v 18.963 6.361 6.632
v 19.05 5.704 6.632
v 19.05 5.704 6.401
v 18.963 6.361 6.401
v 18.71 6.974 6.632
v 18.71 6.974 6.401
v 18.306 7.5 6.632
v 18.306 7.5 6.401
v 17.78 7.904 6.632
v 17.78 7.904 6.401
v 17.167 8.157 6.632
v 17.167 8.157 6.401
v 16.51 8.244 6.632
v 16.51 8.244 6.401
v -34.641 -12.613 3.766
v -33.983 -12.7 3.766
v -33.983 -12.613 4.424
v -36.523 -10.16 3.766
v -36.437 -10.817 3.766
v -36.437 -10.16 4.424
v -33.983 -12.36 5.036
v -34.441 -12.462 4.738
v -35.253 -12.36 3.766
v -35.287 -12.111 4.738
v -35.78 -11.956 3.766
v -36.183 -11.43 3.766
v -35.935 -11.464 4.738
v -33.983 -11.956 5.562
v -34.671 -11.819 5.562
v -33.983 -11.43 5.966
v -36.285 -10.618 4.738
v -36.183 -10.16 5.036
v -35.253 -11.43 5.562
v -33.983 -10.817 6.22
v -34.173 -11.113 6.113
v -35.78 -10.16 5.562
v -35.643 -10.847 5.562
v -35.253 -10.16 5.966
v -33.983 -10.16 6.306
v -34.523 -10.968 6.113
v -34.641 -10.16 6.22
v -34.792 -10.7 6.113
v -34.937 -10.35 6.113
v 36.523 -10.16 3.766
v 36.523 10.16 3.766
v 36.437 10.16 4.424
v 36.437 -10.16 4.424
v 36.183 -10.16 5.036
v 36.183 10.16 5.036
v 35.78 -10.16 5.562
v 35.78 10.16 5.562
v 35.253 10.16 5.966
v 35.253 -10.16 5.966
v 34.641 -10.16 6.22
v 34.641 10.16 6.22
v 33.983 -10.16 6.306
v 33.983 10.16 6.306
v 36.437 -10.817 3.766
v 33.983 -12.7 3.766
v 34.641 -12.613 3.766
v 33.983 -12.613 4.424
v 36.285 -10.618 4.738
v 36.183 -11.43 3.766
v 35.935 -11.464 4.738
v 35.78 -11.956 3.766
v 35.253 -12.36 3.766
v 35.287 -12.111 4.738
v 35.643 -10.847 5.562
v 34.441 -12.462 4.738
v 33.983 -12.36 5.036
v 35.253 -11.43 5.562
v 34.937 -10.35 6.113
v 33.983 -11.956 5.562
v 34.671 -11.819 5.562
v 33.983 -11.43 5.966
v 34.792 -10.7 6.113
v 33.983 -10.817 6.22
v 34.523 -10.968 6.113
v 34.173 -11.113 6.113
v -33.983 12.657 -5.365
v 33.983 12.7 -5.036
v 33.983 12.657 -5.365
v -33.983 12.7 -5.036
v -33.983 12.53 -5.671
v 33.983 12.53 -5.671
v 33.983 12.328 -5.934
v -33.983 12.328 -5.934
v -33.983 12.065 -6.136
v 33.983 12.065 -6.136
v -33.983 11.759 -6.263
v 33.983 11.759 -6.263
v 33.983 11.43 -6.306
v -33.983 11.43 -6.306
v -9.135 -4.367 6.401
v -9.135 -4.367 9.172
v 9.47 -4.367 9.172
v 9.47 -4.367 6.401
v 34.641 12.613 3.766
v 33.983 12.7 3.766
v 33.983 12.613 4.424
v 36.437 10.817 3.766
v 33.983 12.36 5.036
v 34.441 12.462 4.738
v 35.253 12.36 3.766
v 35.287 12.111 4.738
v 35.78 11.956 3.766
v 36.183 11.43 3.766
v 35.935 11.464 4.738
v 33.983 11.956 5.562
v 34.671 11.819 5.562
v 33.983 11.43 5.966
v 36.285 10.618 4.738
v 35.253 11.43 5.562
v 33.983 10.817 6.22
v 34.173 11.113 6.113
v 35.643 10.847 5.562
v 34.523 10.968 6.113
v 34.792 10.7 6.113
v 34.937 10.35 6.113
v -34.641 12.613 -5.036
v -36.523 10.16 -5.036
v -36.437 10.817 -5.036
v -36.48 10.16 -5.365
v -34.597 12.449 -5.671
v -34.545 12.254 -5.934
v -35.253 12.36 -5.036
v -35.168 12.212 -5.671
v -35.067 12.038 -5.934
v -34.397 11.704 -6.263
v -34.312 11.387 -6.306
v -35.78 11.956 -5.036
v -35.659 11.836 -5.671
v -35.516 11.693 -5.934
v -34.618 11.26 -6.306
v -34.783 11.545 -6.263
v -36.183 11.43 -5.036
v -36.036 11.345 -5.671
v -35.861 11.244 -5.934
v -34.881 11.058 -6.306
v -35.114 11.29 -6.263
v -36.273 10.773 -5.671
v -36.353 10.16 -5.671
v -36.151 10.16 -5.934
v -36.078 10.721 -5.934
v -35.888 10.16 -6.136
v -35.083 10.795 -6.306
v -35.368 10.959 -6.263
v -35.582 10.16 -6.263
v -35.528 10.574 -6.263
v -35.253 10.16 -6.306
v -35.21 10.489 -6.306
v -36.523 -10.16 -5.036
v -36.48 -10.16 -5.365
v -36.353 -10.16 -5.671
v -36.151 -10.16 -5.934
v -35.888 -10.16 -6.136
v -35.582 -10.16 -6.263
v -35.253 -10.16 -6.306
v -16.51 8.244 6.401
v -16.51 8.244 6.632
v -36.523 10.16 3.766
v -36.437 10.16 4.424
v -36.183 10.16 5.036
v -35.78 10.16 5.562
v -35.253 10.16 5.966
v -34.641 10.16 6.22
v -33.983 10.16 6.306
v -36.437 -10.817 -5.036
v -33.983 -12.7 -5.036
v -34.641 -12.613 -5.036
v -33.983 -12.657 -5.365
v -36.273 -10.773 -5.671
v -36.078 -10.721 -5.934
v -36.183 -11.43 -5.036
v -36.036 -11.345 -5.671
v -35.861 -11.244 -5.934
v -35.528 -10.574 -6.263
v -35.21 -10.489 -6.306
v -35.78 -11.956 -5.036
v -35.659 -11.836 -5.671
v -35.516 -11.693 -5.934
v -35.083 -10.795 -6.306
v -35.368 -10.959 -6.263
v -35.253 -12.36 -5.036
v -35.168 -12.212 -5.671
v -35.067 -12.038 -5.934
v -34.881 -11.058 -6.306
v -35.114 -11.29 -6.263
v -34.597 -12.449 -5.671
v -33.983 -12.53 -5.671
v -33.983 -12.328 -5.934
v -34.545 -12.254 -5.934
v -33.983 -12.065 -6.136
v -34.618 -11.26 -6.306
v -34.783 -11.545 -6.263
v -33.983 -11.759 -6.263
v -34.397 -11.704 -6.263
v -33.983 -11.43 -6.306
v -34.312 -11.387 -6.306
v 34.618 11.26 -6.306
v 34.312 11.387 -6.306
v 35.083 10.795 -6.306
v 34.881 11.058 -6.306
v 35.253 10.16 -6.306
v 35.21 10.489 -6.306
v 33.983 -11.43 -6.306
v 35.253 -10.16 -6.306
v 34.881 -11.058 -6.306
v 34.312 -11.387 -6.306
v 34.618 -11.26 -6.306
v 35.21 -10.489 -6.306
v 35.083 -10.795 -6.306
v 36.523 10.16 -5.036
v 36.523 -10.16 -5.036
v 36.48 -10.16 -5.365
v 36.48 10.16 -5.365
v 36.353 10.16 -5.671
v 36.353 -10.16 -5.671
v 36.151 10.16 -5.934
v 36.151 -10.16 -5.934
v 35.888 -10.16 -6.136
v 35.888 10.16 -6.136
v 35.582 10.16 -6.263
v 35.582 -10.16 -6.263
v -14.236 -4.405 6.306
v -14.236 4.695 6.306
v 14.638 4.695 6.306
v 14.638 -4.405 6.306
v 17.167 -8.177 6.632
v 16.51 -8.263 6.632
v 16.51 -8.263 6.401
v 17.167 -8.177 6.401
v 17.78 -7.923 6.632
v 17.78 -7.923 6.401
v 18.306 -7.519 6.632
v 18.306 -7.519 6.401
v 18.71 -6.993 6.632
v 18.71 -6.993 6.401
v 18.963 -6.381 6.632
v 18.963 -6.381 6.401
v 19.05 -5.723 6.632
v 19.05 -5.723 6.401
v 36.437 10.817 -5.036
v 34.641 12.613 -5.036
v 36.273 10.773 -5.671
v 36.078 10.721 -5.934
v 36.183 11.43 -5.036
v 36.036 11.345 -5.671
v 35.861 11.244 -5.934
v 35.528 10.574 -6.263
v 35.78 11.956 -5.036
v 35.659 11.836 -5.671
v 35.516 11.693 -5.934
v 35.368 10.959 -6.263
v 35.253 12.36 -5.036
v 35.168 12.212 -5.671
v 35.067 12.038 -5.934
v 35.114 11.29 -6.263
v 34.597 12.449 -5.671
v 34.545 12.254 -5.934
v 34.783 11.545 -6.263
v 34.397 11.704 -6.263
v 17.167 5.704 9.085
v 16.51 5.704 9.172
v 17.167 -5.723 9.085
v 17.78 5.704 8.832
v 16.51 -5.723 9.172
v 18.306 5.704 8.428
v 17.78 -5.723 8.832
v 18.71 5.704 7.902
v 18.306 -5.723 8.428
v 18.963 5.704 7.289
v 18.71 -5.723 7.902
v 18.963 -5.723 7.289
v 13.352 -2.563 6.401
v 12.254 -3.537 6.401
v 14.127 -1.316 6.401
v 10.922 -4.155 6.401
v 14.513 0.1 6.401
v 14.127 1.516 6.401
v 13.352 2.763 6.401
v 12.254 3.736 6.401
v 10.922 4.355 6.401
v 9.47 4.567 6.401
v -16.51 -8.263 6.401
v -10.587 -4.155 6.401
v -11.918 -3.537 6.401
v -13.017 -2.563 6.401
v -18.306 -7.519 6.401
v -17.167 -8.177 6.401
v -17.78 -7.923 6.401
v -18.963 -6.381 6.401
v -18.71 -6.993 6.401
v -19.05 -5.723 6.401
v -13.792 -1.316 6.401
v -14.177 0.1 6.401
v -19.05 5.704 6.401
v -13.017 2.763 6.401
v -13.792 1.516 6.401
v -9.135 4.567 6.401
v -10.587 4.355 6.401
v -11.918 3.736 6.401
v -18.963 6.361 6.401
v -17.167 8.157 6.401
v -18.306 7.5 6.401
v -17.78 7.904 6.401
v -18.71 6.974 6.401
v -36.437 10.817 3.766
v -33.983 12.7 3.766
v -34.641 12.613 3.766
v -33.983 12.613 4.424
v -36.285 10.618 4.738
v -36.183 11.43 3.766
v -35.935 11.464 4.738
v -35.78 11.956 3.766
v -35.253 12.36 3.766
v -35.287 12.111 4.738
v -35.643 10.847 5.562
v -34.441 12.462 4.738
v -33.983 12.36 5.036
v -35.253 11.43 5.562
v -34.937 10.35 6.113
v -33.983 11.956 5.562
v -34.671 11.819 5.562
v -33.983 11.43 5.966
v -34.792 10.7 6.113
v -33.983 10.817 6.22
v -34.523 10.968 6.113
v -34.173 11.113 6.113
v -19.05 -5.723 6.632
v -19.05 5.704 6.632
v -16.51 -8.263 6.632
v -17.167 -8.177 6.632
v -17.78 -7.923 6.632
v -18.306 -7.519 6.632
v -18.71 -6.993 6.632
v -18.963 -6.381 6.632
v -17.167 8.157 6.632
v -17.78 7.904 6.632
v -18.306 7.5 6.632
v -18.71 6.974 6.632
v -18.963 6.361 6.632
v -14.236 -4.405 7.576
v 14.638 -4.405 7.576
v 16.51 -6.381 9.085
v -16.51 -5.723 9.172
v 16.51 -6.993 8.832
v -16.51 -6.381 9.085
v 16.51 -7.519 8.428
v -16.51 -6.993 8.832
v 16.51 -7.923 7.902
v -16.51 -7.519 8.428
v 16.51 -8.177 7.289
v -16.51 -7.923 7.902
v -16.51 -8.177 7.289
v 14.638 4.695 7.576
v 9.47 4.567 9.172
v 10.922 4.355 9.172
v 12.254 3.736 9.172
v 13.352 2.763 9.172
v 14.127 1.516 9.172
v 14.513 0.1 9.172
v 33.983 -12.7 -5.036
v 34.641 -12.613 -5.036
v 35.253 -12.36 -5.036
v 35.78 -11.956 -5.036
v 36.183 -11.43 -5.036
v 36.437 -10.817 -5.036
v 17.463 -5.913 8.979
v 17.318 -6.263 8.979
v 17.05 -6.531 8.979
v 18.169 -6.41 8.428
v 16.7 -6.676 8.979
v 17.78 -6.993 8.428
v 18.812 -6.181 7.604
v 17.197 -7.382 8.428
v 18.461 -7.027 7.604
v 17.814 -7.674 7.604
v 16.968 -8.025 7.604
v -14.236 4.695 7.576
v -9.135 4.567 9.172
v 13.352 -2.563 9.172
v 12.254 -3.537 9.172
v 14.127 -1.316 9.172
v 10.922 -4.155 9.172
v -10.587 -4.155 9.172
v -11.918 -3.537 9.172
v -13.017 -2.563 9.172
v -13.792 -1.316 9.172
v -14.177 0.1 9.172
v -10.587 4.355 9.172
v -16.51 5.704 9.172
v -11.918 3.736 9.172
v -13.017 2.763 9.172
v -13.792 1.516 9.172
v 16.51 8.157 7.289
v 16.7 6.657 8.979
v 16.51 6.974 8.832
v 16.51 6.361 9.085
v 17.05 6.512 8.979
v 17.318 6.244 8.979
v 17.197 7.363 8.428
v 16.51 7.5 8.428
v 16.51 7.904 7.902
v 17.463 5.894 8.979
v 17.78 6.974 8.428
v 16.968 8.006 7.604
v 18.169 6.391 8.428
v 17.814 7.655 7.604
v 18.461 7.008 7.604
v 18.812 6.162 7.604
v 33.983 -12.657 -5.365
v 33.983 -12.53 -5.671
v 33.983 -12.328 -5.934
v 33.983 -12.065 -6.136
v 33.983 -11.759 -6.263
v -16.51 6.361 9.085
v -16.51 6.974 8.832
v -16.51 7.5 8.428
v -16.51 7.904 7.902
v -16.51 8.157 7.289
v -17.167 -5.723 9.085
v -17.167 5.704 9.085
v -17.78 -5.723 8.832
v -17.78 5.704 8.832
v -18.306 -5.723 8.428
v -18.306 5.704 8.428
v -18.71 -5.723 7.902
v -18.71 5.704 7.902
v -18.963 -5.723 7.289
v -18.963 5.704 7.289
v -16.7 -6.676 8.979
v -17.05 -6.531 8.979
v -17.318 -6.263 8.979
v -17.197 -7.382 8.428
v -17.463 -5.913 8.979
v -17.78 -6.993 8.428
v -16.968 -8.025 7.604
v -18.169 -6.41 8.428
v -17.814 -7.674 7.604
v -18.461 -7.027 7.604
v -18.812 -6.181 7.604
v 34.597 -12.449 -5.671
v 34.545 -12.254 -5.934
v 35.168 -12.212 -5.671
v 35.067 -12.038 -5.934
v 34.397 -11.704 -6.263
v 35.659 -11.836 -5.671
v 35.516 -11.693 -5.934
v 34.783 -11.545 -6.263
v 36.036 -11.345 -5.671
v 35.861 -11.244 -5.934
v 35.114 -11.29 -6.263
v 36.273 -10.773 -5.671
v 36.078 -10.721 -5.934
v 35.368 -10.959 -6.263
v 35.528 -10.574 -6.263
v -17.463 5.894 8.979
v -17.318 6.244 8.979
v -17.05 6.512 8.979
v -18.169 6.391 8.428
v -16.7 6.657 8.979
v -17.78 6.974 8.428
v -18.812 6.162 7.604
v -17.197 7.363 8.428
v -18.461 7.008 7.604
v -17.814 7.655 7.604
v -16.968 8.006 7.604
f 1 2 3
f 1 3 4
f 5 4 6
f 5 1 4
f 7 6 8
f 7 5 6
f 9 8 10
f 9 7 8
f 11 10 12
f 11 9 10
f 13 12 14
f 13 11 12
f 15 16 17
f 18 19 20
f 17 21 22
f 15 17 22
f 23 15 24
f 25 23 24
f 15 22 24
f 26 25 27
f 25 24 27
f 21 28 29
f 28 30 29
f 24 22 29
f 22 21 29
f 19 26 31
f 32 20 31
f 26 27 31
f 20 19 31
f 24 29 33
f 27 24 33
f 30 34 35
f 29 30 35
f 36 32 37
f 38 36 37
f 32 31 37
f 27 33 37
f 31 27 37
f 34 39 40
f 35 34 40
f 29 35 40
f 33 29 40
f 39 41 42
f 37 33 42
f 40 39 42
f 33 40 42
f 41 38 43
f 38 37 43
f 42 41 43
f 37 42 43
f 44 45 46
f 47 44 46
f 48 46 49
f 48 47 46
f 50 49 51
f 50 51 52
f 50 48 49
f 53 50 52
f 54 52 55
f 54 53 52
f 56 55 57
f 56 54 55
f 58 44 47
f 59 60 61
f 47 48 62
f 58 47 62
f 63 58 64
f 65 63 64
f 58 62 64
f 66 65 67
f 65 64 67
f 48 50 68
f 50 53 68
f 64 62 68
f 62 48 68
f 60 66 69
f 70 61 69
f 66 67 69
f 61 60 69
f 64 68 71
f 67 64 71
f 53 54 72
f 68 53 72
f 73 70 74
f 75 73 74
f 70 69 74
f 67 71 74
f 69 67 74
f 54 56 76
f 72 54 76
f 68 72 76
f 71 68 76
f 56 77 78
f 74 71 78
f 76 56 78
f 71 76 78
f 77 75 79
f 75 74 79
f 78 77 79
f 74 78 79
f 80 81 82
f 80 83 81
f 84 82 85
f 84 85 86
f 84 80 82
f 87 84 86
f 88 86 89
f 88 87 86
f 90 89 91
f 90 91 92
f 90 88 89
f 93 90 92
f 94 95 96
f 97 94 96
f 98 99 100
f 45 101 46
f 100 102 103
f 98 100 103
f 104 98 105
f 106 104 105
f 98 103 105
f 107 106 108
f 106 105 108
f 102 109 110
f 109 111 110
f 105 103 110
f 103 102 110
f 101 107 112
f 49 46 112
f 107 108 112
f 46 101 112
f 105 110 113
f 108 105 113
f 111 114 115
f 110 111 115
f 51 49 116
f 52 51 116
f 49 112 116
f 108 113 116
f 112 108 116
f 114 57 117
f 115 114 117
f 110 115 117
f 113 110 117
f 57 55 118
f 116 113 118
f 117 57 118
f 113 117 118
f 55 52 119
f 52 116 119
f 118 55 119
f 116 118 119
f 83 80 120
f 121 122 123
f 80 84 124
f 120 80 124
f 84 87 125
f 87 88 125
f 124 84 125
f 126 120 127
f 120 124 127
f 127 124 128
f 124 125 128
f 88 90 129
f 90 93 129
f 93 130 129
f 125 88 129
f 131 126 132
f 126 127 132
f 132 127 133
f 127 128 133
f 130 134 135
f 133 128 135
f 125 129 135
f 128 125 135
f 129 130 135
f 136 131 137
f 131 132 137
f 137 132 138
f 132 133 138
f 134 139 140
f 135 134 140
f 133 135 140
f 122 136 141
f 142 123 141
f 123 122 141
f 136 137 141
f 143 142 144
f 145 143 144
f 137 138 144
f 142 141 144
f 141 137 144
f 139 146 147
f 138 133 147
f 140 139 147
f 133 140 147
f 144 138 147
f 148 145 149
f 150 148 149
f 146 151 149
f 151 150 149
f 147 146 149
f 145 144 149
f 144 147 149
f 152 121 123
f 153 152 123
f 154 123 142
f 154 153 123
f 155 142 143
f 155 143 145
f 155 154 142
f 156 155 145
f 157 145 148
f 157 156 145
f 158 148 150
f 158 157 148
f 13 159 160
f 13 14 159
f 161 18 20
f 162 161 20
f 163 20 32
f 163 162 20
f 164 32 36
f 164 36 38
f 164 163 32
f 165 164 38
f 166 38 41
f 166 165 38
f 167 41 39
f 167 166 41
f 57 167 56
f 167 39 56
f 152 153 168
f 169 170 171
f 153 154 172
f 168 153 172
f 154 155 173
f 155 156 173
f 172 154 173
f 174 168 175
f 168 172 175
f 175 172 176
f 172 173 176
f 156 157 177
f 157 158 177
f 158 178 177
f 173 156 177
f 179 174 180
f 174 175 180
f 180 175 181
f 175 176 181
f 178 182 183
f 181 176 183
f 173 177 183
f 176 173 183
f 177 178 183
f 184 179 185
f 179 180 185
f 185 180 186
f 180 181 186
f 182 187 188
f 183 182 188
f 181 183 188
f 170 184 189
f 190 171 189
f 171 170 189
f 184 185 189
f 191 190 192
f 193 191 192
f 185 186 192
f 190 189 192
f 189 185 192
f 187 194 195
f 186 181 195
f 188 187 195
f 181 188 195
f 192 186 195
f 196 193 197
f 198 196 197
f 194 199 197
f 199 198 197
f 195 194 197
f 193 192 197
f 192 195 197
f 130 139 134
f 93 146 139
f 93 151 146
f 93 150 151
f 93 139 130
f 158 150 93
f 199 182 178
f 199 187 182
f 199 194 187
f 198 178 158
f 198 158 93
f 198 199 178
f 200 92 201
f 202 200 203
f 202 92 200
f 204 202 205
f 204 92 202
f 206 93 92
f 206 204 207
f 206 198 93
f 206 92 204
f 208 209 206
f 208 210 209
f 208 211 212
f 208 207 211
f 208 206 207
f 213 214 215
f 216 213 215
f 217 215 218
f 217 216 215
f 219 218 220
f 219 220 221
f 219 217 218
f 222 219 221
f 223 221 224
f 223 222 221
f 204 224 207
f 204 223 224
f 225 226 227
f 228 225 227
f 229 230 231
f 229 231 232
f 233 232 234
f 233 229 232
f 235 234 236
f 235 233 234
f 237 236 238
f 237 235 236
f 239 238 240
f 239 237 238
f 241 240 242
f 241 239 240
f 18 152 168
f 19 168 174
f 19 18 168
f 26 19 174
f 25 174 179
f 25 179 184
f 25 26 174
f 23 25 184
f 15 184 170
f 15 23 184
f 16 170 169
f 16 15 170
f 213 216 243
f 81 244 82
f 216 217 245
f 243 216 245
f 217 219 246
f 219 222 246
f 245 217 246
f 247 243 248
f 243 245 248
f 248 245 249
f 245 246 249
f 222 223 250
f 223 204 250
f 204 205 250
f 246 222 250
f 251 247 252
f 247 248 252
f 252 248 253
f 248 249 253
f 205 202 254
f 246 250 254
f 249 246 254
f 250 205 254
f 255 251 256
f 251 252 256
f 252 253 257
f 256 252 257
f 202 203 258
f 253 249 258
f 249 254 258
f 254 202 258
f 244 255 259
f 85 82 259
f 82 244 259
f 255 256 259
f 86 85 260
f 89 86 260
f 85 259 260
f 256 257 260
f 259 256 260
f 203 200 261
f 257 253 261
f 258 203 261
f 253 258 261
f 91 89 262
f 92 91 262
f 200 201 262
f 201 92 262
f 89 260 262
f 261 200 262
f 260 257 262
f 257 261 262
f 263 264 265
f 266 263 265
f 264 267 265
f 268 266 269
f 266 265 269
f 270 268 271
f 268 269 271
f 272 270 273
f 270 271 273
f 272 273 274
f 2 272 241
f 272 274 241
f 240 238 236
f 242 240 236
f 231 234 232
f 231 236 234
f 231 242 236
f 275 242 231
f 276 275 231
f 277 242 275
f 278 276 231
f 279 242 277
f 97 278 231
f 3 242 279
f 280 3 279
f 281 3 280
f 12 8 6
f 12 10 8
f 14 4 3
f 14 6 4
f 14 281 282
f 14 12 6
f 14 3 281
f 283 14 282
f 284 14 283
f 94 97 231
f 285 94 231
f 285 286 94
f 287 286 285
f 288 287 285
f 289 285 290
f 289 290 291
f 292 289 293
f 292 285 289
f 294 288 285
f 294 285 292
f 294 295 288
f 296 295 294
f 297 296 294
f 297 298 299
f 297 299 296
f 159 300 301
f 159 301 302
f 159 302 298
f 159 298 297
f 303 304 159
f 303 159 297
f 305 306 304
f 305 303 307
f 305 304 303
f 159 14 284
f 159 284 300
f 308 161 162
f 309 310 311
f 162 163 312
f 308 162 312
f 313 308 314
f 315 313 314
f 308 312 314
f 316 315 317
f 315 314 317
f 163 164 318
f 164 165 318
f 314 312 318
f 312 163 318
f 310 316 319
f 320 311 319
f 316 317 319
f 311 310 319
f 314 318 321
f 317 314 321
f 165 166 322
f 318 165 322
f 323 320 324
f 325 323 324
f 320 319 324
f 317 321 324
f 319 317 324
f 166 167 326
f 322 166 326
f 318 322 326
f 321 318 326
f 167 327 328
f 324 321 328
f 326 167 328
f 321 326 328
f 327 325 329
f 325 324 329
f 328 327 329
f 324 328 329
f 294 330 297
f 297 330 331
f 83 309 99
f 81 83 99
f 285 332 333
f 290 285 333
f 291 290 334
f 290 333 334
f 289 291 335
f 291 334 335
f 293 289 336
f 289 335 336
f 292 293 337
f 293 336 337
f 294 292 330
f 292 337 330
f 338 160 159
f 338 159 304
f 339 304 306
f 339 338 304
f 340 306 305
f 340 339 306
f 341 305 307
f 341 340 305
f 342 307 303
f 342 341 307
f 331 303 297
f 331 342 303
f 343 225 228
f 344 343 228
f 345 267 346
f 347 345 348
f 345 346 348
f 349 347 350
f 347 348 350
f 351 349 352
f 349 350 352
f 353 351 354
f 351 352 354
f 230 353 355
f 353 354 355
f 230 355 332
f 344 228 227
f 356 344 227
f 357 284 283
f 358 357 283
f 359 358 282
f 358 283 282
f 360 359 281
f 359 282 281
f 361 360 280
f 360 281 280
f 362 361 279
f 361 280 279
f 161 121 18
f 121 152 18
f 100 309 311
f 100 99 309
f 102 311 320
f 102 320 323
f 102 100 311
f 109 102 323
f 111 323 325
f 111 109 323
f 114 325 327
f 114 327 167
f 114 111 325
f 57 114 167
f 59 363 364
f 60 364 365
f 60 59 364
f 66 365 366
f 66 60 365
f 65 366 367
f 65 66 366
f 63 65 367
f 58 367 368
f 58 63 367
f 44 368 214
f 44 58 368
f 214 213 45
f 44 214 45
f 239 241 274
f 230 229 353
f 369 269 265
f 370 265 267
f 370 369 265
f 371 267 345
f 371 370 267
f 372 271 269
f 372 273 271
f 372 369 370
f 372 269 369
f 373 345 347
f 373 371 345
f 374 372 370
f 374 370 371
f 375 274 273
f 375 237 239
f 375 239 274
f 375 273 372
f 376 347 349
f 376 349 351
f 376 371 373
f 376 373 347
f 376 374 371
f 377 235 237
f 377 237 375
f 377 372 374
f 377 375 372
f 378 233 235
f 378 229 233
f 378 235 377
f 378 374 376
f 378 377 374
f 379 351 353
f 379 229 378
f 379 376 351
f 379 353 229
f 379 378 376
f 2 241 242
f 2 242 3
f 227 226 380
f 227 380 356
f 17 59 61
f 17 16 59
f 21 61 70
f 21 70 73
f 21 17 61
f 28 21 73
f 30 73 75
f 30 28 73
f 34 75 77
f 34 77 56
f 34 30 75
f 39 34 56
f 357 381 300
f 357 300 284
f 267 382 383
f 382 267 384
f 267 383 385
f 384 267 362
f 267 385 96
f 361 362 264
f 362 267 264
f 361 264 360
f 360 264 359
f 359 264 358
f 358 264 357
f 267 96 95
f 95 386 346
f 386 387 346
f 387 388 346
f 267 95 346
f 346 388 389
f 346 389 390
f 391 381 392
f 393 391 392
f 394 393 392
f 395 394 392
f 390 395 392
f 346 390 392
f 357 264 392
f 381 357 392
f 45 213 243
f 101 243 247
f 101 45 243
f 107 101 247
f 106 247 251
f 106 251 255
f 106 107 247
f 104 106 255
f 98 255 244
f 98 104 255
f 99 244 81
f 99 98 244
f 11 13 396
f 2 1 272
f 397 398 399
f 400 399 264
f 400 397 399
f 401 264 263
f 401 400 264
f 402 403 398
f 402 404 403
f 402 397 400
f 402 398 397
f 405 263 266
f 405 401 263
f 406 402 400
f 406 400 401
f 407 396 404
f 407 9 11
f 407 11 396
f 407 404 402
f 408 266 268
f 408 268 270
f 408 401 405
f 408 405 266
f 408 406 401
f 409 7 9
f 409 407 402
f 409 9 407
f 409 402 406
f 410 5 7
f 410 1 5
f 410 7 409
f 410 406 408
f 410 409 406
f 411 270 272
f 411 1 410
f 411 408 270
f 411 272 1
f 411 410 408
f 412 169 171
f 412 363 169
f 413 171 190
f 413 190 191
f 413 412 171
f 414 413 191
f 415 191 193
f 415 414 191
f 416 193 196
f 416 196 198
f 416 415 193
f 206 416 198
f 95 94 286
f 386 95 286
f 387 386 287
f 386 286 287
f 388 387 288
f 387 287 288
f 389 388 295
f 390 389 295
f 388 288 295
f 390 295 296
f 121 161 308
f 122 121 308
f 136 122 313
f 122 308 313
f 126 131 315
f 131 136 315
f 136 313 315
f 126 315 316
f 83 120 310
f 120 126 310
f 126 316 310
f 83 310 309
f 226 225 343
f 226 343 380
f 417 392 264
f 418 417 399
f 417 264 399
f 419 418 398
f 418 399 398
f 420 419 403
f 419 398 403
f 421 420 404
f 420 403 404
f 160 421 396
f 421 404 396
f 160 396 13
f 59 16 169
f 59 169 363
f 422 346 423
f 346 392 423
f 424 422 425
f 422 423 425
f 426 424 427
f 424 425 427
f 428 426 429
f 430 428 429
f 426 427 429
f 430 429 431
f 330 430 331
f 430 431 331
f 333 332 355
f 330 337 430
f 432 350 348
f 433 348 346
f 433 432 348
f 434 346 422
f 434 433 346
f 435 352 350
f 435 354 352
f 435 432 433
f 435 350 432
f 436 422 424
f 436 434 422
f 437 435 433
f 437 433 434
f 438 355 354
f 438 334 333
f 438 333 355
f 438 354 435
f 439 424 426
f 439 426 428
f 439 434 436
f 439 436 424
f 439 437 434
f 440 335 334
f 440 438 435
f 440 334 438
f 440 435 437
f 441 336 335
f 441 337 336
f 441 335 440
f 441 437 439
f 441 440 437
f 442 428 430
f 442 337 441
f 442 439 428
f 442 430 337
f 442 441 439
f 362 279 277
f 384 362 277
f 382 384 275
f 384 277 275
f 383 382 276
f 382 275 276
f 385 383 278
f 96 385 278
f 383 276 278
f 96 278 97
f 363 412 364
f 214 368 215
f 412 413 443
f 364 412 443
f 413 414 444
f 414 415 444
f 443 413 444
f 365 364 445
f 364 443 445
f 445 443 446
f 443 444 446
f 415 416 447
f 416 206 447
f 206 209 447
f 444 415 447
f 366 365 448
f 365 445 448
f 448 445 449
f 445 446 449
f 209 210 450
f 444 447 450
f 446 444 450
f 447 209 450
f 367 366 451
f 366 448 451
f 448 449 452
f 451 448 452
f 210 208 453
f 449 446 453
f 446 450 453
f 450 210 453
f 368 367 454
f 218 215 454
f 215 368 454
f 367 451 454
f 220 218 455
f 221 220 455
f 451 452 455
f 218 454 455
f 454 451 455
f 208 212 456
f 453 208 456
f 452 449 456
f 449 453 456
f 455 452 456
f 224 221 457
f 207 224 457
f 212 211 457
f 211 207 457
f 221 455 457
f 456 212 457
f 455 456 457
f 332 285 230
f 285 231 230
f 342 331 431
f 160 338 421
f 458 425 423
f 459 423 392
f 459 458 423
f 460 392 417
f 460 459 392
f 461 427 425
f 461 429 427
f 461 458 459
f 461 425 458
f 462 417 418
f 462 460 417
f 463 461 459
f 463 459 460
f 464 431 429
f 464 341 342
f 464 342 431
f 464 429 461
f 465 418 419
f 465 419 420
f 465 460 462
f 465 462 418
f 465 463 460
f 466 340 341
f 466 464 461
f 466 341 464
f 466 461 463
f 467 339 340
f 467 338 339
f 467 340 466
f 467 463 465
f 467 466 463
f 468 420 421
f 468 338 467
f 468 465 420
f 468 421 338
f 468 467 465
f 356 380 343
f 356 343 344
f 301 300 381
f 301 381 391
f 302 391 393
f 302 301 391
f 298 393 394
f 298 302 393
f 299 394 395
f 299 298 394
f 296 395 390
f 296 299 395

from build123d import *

# Parameters (mm, degrees)
F0_W        = 73.046900332
F0_H        = 12.6124145463
F1_DEPTH    = 12.7
F2_W        = 16.5071599185
F2_H        = 2.7704327367
F3_DEPTH    = 19.05
F4_R        = 2.54
F4_2_R      = 2.54
F5_R        = 2.54
F6_W        = 28.7643400952
F6_H        = 8.9343790896
F7_DEPTH    = 2.54
F8_DEPTH    = 11.938
F9_T1_DEPTH = 2.7704327367
F10_W       = 28.8739772514
F10_H       = 9.0996772051
F11_DEPTH   = 1.27
F12_R       = 2.54
F13_R       = 1.27


# Not quite as in the source:
# - a fillet or chamfer that OpenCascade refuses, or shapes differently, is made with other operations: its cross-section is extruded or revolved along the edge and cut away or added


with BuildPart() as f1:
    # F0 (on Front) → F1 (new body, symmetric)
    with BuildSketch(Plane.XZ):
        Rectangle(F0_W, F0_H)
    extrude(amount=F1_DEPTH, both=True)

    # F4
    f4_edges = [f1.edges().sort_by_distance(p)[0] for p in [
        (-36.52345, 12.7, 0),
        (-36.52345, -12.7, 0),
        (36.52345, 12.7, 0),
        (36.52345, -12.7, 0),
    ]]
    fillet(f4_edges, radius=F4_R)

    # F5
    f5_edges = [f1.edges().sort_by_distance(p)[0] for p in [
        (-35.779501, 11.956051, 6.306207),
    ]]
    fillet(f5_edges, radius=F5_R)

    # F6 (on face) → F7 (cut)
    with BuildSketch(Plane.XY.offset(9.1719310731)):
        with Locations((0.1675928943, 0.0998361502)):
            Rectangle(F6_W, F6_H)
    extrude(amount=F7_DEPTH, mode=Mode.SUBTRACT)

    # F13
    f13_edges = [f1.edges().sort_by_distance(p)[0] for p in [
        (-36.52345, 0, -6.306207),
        (0, -12.7, -6.306207),
        (36.52345, 0, -6.306207),
        (0, 12.7, -6.306207),
        (-35.779501, -11.956051, -6.306207),
        (-35.779501, 11.956051, -6.306207),
        (35.779501, 11.956051, -6.306207),
        (35.779501, -11.956051, -6.306207),
    ]]
    fillet(f13_edges, radius=F13_R)


with BuildPart() as f3:
    # F2 (on Right) → F3 (new body, symmetric)
    with BuildSketch(Plane.YZ):
        with Locations((-0.0095358118, 7.7867147047)):
            Rectangle(F2_W, F2_H)
    extrude(amount=F3_DEPTH, both=True)

    # F4#2
    f4_2_edges = [f3.edges().sort_by_distance(p)[0] for p in [
        (-19.05, -8.263116, 7.786715),
        (19.05, -8.263116, 7.786715),
        (-19.05, 8.244044, 7.786715),
        (19.05, 8.244044, 7.786715),
    ]]
    fillet(f4_2_edges, radius=F4_2_R)

    # F6 (on face) → F8 (cut)
    with BuildSketch(Plane.XY.offset(9.1719310731)):
        with Locations((0.1675928943, 0.0998361502)):
            Rectangle(F6_W, F6_H)
    extrude(amount=-F8_DEPTH, mode=Mode.SUBTRACT)

    # F9: fillet of radius 5.08 on 4 edges, made by hand

    # F9_s2 → F9_t1 (join)
    with BuildSketch(Plane.XY.offset(6.4014983363)):
        with BuildLine():
            ThreePointArc((-9.1345771533, 4.567025695), (-12.7266796018, 3.0791281434), (-14.2145771533, -0.512974305))
            Line((-14.2145771533, -0.512974305), (-14.2145771533, 4.567025695))
            Line((-14.2145771533, 4.567025695), (-9.1345771533, 4.567025695))
        make_face()
        with BuildLine():
            ThreePointArc((14.5497629419, 0.7126466054), (13.0618653903, -2.8794558431), (9.4697629419, -4.3673533946))
            Line((9.4697629419, -4.3673533946), (14.5497629419, -4.3673533946))
            Line((14.5497629419, -4.3673533946), (14.5497629419, 0.7126466054))
        make_face()
        with BuildLine():
            ThreePointArc((-9.1345771533, -4.3673533946), (-12.7266796018, -2.8794558431), (-14.2145771533, 0.7126466054))
            Line((-14.2145771533, 0.7126466054), (-14.2145771533, -4.3673533946))
            Line((-14.2145771533, -4.3673533946), (-9.1345771533, -4.3673533946))
        make_face()
        with BuildLine():
            ThreePointArc((9.4697629419, 4.567025695), (13.0618653903, 3.0791281434), (14.5497629419, -0.512974305))
            Line((14.5497629419, -0.512974305), (14.5497629419, 4.567025695))
            Line((14.5497629419, 4.567025695), (9.4697629419, 4.567025695))
        make_face()
    extrude(amount=F9_T1_DEPTH)

    # F12
    f12_edges = [f3.edges().sort_by_distance(p)[0] for p in [
        (-19.05, -0.009536, 9.171931),
        (-18.306051, -7.519167, 9.171931),
        (-18.306051, 7.500095, 9.171931),
        (0, -8.263116, 9.171931),
        (0, 8.244044, 9.171931),
        (18.306051, -7.519167, 9.171931),
        (18.306051, 7.500095, 9.171931),
        (19.05, -0.009536, 9.171931),
    ]]
    fillet(f12_edges, radius=F12_R)


with BuildPart() as f11:
    # F10 (on face) → F11 (new body)
    with BuildSketch(Plane.XY.offset(6.3062072732)):
        with Locations((0.2010739408, 0.1450735144)):
            Rectangle(F10_W, F10_H)
    extrude(amount=F11_DEPTH)


solid = Compound([f1.part, f3.part, f11.part])
